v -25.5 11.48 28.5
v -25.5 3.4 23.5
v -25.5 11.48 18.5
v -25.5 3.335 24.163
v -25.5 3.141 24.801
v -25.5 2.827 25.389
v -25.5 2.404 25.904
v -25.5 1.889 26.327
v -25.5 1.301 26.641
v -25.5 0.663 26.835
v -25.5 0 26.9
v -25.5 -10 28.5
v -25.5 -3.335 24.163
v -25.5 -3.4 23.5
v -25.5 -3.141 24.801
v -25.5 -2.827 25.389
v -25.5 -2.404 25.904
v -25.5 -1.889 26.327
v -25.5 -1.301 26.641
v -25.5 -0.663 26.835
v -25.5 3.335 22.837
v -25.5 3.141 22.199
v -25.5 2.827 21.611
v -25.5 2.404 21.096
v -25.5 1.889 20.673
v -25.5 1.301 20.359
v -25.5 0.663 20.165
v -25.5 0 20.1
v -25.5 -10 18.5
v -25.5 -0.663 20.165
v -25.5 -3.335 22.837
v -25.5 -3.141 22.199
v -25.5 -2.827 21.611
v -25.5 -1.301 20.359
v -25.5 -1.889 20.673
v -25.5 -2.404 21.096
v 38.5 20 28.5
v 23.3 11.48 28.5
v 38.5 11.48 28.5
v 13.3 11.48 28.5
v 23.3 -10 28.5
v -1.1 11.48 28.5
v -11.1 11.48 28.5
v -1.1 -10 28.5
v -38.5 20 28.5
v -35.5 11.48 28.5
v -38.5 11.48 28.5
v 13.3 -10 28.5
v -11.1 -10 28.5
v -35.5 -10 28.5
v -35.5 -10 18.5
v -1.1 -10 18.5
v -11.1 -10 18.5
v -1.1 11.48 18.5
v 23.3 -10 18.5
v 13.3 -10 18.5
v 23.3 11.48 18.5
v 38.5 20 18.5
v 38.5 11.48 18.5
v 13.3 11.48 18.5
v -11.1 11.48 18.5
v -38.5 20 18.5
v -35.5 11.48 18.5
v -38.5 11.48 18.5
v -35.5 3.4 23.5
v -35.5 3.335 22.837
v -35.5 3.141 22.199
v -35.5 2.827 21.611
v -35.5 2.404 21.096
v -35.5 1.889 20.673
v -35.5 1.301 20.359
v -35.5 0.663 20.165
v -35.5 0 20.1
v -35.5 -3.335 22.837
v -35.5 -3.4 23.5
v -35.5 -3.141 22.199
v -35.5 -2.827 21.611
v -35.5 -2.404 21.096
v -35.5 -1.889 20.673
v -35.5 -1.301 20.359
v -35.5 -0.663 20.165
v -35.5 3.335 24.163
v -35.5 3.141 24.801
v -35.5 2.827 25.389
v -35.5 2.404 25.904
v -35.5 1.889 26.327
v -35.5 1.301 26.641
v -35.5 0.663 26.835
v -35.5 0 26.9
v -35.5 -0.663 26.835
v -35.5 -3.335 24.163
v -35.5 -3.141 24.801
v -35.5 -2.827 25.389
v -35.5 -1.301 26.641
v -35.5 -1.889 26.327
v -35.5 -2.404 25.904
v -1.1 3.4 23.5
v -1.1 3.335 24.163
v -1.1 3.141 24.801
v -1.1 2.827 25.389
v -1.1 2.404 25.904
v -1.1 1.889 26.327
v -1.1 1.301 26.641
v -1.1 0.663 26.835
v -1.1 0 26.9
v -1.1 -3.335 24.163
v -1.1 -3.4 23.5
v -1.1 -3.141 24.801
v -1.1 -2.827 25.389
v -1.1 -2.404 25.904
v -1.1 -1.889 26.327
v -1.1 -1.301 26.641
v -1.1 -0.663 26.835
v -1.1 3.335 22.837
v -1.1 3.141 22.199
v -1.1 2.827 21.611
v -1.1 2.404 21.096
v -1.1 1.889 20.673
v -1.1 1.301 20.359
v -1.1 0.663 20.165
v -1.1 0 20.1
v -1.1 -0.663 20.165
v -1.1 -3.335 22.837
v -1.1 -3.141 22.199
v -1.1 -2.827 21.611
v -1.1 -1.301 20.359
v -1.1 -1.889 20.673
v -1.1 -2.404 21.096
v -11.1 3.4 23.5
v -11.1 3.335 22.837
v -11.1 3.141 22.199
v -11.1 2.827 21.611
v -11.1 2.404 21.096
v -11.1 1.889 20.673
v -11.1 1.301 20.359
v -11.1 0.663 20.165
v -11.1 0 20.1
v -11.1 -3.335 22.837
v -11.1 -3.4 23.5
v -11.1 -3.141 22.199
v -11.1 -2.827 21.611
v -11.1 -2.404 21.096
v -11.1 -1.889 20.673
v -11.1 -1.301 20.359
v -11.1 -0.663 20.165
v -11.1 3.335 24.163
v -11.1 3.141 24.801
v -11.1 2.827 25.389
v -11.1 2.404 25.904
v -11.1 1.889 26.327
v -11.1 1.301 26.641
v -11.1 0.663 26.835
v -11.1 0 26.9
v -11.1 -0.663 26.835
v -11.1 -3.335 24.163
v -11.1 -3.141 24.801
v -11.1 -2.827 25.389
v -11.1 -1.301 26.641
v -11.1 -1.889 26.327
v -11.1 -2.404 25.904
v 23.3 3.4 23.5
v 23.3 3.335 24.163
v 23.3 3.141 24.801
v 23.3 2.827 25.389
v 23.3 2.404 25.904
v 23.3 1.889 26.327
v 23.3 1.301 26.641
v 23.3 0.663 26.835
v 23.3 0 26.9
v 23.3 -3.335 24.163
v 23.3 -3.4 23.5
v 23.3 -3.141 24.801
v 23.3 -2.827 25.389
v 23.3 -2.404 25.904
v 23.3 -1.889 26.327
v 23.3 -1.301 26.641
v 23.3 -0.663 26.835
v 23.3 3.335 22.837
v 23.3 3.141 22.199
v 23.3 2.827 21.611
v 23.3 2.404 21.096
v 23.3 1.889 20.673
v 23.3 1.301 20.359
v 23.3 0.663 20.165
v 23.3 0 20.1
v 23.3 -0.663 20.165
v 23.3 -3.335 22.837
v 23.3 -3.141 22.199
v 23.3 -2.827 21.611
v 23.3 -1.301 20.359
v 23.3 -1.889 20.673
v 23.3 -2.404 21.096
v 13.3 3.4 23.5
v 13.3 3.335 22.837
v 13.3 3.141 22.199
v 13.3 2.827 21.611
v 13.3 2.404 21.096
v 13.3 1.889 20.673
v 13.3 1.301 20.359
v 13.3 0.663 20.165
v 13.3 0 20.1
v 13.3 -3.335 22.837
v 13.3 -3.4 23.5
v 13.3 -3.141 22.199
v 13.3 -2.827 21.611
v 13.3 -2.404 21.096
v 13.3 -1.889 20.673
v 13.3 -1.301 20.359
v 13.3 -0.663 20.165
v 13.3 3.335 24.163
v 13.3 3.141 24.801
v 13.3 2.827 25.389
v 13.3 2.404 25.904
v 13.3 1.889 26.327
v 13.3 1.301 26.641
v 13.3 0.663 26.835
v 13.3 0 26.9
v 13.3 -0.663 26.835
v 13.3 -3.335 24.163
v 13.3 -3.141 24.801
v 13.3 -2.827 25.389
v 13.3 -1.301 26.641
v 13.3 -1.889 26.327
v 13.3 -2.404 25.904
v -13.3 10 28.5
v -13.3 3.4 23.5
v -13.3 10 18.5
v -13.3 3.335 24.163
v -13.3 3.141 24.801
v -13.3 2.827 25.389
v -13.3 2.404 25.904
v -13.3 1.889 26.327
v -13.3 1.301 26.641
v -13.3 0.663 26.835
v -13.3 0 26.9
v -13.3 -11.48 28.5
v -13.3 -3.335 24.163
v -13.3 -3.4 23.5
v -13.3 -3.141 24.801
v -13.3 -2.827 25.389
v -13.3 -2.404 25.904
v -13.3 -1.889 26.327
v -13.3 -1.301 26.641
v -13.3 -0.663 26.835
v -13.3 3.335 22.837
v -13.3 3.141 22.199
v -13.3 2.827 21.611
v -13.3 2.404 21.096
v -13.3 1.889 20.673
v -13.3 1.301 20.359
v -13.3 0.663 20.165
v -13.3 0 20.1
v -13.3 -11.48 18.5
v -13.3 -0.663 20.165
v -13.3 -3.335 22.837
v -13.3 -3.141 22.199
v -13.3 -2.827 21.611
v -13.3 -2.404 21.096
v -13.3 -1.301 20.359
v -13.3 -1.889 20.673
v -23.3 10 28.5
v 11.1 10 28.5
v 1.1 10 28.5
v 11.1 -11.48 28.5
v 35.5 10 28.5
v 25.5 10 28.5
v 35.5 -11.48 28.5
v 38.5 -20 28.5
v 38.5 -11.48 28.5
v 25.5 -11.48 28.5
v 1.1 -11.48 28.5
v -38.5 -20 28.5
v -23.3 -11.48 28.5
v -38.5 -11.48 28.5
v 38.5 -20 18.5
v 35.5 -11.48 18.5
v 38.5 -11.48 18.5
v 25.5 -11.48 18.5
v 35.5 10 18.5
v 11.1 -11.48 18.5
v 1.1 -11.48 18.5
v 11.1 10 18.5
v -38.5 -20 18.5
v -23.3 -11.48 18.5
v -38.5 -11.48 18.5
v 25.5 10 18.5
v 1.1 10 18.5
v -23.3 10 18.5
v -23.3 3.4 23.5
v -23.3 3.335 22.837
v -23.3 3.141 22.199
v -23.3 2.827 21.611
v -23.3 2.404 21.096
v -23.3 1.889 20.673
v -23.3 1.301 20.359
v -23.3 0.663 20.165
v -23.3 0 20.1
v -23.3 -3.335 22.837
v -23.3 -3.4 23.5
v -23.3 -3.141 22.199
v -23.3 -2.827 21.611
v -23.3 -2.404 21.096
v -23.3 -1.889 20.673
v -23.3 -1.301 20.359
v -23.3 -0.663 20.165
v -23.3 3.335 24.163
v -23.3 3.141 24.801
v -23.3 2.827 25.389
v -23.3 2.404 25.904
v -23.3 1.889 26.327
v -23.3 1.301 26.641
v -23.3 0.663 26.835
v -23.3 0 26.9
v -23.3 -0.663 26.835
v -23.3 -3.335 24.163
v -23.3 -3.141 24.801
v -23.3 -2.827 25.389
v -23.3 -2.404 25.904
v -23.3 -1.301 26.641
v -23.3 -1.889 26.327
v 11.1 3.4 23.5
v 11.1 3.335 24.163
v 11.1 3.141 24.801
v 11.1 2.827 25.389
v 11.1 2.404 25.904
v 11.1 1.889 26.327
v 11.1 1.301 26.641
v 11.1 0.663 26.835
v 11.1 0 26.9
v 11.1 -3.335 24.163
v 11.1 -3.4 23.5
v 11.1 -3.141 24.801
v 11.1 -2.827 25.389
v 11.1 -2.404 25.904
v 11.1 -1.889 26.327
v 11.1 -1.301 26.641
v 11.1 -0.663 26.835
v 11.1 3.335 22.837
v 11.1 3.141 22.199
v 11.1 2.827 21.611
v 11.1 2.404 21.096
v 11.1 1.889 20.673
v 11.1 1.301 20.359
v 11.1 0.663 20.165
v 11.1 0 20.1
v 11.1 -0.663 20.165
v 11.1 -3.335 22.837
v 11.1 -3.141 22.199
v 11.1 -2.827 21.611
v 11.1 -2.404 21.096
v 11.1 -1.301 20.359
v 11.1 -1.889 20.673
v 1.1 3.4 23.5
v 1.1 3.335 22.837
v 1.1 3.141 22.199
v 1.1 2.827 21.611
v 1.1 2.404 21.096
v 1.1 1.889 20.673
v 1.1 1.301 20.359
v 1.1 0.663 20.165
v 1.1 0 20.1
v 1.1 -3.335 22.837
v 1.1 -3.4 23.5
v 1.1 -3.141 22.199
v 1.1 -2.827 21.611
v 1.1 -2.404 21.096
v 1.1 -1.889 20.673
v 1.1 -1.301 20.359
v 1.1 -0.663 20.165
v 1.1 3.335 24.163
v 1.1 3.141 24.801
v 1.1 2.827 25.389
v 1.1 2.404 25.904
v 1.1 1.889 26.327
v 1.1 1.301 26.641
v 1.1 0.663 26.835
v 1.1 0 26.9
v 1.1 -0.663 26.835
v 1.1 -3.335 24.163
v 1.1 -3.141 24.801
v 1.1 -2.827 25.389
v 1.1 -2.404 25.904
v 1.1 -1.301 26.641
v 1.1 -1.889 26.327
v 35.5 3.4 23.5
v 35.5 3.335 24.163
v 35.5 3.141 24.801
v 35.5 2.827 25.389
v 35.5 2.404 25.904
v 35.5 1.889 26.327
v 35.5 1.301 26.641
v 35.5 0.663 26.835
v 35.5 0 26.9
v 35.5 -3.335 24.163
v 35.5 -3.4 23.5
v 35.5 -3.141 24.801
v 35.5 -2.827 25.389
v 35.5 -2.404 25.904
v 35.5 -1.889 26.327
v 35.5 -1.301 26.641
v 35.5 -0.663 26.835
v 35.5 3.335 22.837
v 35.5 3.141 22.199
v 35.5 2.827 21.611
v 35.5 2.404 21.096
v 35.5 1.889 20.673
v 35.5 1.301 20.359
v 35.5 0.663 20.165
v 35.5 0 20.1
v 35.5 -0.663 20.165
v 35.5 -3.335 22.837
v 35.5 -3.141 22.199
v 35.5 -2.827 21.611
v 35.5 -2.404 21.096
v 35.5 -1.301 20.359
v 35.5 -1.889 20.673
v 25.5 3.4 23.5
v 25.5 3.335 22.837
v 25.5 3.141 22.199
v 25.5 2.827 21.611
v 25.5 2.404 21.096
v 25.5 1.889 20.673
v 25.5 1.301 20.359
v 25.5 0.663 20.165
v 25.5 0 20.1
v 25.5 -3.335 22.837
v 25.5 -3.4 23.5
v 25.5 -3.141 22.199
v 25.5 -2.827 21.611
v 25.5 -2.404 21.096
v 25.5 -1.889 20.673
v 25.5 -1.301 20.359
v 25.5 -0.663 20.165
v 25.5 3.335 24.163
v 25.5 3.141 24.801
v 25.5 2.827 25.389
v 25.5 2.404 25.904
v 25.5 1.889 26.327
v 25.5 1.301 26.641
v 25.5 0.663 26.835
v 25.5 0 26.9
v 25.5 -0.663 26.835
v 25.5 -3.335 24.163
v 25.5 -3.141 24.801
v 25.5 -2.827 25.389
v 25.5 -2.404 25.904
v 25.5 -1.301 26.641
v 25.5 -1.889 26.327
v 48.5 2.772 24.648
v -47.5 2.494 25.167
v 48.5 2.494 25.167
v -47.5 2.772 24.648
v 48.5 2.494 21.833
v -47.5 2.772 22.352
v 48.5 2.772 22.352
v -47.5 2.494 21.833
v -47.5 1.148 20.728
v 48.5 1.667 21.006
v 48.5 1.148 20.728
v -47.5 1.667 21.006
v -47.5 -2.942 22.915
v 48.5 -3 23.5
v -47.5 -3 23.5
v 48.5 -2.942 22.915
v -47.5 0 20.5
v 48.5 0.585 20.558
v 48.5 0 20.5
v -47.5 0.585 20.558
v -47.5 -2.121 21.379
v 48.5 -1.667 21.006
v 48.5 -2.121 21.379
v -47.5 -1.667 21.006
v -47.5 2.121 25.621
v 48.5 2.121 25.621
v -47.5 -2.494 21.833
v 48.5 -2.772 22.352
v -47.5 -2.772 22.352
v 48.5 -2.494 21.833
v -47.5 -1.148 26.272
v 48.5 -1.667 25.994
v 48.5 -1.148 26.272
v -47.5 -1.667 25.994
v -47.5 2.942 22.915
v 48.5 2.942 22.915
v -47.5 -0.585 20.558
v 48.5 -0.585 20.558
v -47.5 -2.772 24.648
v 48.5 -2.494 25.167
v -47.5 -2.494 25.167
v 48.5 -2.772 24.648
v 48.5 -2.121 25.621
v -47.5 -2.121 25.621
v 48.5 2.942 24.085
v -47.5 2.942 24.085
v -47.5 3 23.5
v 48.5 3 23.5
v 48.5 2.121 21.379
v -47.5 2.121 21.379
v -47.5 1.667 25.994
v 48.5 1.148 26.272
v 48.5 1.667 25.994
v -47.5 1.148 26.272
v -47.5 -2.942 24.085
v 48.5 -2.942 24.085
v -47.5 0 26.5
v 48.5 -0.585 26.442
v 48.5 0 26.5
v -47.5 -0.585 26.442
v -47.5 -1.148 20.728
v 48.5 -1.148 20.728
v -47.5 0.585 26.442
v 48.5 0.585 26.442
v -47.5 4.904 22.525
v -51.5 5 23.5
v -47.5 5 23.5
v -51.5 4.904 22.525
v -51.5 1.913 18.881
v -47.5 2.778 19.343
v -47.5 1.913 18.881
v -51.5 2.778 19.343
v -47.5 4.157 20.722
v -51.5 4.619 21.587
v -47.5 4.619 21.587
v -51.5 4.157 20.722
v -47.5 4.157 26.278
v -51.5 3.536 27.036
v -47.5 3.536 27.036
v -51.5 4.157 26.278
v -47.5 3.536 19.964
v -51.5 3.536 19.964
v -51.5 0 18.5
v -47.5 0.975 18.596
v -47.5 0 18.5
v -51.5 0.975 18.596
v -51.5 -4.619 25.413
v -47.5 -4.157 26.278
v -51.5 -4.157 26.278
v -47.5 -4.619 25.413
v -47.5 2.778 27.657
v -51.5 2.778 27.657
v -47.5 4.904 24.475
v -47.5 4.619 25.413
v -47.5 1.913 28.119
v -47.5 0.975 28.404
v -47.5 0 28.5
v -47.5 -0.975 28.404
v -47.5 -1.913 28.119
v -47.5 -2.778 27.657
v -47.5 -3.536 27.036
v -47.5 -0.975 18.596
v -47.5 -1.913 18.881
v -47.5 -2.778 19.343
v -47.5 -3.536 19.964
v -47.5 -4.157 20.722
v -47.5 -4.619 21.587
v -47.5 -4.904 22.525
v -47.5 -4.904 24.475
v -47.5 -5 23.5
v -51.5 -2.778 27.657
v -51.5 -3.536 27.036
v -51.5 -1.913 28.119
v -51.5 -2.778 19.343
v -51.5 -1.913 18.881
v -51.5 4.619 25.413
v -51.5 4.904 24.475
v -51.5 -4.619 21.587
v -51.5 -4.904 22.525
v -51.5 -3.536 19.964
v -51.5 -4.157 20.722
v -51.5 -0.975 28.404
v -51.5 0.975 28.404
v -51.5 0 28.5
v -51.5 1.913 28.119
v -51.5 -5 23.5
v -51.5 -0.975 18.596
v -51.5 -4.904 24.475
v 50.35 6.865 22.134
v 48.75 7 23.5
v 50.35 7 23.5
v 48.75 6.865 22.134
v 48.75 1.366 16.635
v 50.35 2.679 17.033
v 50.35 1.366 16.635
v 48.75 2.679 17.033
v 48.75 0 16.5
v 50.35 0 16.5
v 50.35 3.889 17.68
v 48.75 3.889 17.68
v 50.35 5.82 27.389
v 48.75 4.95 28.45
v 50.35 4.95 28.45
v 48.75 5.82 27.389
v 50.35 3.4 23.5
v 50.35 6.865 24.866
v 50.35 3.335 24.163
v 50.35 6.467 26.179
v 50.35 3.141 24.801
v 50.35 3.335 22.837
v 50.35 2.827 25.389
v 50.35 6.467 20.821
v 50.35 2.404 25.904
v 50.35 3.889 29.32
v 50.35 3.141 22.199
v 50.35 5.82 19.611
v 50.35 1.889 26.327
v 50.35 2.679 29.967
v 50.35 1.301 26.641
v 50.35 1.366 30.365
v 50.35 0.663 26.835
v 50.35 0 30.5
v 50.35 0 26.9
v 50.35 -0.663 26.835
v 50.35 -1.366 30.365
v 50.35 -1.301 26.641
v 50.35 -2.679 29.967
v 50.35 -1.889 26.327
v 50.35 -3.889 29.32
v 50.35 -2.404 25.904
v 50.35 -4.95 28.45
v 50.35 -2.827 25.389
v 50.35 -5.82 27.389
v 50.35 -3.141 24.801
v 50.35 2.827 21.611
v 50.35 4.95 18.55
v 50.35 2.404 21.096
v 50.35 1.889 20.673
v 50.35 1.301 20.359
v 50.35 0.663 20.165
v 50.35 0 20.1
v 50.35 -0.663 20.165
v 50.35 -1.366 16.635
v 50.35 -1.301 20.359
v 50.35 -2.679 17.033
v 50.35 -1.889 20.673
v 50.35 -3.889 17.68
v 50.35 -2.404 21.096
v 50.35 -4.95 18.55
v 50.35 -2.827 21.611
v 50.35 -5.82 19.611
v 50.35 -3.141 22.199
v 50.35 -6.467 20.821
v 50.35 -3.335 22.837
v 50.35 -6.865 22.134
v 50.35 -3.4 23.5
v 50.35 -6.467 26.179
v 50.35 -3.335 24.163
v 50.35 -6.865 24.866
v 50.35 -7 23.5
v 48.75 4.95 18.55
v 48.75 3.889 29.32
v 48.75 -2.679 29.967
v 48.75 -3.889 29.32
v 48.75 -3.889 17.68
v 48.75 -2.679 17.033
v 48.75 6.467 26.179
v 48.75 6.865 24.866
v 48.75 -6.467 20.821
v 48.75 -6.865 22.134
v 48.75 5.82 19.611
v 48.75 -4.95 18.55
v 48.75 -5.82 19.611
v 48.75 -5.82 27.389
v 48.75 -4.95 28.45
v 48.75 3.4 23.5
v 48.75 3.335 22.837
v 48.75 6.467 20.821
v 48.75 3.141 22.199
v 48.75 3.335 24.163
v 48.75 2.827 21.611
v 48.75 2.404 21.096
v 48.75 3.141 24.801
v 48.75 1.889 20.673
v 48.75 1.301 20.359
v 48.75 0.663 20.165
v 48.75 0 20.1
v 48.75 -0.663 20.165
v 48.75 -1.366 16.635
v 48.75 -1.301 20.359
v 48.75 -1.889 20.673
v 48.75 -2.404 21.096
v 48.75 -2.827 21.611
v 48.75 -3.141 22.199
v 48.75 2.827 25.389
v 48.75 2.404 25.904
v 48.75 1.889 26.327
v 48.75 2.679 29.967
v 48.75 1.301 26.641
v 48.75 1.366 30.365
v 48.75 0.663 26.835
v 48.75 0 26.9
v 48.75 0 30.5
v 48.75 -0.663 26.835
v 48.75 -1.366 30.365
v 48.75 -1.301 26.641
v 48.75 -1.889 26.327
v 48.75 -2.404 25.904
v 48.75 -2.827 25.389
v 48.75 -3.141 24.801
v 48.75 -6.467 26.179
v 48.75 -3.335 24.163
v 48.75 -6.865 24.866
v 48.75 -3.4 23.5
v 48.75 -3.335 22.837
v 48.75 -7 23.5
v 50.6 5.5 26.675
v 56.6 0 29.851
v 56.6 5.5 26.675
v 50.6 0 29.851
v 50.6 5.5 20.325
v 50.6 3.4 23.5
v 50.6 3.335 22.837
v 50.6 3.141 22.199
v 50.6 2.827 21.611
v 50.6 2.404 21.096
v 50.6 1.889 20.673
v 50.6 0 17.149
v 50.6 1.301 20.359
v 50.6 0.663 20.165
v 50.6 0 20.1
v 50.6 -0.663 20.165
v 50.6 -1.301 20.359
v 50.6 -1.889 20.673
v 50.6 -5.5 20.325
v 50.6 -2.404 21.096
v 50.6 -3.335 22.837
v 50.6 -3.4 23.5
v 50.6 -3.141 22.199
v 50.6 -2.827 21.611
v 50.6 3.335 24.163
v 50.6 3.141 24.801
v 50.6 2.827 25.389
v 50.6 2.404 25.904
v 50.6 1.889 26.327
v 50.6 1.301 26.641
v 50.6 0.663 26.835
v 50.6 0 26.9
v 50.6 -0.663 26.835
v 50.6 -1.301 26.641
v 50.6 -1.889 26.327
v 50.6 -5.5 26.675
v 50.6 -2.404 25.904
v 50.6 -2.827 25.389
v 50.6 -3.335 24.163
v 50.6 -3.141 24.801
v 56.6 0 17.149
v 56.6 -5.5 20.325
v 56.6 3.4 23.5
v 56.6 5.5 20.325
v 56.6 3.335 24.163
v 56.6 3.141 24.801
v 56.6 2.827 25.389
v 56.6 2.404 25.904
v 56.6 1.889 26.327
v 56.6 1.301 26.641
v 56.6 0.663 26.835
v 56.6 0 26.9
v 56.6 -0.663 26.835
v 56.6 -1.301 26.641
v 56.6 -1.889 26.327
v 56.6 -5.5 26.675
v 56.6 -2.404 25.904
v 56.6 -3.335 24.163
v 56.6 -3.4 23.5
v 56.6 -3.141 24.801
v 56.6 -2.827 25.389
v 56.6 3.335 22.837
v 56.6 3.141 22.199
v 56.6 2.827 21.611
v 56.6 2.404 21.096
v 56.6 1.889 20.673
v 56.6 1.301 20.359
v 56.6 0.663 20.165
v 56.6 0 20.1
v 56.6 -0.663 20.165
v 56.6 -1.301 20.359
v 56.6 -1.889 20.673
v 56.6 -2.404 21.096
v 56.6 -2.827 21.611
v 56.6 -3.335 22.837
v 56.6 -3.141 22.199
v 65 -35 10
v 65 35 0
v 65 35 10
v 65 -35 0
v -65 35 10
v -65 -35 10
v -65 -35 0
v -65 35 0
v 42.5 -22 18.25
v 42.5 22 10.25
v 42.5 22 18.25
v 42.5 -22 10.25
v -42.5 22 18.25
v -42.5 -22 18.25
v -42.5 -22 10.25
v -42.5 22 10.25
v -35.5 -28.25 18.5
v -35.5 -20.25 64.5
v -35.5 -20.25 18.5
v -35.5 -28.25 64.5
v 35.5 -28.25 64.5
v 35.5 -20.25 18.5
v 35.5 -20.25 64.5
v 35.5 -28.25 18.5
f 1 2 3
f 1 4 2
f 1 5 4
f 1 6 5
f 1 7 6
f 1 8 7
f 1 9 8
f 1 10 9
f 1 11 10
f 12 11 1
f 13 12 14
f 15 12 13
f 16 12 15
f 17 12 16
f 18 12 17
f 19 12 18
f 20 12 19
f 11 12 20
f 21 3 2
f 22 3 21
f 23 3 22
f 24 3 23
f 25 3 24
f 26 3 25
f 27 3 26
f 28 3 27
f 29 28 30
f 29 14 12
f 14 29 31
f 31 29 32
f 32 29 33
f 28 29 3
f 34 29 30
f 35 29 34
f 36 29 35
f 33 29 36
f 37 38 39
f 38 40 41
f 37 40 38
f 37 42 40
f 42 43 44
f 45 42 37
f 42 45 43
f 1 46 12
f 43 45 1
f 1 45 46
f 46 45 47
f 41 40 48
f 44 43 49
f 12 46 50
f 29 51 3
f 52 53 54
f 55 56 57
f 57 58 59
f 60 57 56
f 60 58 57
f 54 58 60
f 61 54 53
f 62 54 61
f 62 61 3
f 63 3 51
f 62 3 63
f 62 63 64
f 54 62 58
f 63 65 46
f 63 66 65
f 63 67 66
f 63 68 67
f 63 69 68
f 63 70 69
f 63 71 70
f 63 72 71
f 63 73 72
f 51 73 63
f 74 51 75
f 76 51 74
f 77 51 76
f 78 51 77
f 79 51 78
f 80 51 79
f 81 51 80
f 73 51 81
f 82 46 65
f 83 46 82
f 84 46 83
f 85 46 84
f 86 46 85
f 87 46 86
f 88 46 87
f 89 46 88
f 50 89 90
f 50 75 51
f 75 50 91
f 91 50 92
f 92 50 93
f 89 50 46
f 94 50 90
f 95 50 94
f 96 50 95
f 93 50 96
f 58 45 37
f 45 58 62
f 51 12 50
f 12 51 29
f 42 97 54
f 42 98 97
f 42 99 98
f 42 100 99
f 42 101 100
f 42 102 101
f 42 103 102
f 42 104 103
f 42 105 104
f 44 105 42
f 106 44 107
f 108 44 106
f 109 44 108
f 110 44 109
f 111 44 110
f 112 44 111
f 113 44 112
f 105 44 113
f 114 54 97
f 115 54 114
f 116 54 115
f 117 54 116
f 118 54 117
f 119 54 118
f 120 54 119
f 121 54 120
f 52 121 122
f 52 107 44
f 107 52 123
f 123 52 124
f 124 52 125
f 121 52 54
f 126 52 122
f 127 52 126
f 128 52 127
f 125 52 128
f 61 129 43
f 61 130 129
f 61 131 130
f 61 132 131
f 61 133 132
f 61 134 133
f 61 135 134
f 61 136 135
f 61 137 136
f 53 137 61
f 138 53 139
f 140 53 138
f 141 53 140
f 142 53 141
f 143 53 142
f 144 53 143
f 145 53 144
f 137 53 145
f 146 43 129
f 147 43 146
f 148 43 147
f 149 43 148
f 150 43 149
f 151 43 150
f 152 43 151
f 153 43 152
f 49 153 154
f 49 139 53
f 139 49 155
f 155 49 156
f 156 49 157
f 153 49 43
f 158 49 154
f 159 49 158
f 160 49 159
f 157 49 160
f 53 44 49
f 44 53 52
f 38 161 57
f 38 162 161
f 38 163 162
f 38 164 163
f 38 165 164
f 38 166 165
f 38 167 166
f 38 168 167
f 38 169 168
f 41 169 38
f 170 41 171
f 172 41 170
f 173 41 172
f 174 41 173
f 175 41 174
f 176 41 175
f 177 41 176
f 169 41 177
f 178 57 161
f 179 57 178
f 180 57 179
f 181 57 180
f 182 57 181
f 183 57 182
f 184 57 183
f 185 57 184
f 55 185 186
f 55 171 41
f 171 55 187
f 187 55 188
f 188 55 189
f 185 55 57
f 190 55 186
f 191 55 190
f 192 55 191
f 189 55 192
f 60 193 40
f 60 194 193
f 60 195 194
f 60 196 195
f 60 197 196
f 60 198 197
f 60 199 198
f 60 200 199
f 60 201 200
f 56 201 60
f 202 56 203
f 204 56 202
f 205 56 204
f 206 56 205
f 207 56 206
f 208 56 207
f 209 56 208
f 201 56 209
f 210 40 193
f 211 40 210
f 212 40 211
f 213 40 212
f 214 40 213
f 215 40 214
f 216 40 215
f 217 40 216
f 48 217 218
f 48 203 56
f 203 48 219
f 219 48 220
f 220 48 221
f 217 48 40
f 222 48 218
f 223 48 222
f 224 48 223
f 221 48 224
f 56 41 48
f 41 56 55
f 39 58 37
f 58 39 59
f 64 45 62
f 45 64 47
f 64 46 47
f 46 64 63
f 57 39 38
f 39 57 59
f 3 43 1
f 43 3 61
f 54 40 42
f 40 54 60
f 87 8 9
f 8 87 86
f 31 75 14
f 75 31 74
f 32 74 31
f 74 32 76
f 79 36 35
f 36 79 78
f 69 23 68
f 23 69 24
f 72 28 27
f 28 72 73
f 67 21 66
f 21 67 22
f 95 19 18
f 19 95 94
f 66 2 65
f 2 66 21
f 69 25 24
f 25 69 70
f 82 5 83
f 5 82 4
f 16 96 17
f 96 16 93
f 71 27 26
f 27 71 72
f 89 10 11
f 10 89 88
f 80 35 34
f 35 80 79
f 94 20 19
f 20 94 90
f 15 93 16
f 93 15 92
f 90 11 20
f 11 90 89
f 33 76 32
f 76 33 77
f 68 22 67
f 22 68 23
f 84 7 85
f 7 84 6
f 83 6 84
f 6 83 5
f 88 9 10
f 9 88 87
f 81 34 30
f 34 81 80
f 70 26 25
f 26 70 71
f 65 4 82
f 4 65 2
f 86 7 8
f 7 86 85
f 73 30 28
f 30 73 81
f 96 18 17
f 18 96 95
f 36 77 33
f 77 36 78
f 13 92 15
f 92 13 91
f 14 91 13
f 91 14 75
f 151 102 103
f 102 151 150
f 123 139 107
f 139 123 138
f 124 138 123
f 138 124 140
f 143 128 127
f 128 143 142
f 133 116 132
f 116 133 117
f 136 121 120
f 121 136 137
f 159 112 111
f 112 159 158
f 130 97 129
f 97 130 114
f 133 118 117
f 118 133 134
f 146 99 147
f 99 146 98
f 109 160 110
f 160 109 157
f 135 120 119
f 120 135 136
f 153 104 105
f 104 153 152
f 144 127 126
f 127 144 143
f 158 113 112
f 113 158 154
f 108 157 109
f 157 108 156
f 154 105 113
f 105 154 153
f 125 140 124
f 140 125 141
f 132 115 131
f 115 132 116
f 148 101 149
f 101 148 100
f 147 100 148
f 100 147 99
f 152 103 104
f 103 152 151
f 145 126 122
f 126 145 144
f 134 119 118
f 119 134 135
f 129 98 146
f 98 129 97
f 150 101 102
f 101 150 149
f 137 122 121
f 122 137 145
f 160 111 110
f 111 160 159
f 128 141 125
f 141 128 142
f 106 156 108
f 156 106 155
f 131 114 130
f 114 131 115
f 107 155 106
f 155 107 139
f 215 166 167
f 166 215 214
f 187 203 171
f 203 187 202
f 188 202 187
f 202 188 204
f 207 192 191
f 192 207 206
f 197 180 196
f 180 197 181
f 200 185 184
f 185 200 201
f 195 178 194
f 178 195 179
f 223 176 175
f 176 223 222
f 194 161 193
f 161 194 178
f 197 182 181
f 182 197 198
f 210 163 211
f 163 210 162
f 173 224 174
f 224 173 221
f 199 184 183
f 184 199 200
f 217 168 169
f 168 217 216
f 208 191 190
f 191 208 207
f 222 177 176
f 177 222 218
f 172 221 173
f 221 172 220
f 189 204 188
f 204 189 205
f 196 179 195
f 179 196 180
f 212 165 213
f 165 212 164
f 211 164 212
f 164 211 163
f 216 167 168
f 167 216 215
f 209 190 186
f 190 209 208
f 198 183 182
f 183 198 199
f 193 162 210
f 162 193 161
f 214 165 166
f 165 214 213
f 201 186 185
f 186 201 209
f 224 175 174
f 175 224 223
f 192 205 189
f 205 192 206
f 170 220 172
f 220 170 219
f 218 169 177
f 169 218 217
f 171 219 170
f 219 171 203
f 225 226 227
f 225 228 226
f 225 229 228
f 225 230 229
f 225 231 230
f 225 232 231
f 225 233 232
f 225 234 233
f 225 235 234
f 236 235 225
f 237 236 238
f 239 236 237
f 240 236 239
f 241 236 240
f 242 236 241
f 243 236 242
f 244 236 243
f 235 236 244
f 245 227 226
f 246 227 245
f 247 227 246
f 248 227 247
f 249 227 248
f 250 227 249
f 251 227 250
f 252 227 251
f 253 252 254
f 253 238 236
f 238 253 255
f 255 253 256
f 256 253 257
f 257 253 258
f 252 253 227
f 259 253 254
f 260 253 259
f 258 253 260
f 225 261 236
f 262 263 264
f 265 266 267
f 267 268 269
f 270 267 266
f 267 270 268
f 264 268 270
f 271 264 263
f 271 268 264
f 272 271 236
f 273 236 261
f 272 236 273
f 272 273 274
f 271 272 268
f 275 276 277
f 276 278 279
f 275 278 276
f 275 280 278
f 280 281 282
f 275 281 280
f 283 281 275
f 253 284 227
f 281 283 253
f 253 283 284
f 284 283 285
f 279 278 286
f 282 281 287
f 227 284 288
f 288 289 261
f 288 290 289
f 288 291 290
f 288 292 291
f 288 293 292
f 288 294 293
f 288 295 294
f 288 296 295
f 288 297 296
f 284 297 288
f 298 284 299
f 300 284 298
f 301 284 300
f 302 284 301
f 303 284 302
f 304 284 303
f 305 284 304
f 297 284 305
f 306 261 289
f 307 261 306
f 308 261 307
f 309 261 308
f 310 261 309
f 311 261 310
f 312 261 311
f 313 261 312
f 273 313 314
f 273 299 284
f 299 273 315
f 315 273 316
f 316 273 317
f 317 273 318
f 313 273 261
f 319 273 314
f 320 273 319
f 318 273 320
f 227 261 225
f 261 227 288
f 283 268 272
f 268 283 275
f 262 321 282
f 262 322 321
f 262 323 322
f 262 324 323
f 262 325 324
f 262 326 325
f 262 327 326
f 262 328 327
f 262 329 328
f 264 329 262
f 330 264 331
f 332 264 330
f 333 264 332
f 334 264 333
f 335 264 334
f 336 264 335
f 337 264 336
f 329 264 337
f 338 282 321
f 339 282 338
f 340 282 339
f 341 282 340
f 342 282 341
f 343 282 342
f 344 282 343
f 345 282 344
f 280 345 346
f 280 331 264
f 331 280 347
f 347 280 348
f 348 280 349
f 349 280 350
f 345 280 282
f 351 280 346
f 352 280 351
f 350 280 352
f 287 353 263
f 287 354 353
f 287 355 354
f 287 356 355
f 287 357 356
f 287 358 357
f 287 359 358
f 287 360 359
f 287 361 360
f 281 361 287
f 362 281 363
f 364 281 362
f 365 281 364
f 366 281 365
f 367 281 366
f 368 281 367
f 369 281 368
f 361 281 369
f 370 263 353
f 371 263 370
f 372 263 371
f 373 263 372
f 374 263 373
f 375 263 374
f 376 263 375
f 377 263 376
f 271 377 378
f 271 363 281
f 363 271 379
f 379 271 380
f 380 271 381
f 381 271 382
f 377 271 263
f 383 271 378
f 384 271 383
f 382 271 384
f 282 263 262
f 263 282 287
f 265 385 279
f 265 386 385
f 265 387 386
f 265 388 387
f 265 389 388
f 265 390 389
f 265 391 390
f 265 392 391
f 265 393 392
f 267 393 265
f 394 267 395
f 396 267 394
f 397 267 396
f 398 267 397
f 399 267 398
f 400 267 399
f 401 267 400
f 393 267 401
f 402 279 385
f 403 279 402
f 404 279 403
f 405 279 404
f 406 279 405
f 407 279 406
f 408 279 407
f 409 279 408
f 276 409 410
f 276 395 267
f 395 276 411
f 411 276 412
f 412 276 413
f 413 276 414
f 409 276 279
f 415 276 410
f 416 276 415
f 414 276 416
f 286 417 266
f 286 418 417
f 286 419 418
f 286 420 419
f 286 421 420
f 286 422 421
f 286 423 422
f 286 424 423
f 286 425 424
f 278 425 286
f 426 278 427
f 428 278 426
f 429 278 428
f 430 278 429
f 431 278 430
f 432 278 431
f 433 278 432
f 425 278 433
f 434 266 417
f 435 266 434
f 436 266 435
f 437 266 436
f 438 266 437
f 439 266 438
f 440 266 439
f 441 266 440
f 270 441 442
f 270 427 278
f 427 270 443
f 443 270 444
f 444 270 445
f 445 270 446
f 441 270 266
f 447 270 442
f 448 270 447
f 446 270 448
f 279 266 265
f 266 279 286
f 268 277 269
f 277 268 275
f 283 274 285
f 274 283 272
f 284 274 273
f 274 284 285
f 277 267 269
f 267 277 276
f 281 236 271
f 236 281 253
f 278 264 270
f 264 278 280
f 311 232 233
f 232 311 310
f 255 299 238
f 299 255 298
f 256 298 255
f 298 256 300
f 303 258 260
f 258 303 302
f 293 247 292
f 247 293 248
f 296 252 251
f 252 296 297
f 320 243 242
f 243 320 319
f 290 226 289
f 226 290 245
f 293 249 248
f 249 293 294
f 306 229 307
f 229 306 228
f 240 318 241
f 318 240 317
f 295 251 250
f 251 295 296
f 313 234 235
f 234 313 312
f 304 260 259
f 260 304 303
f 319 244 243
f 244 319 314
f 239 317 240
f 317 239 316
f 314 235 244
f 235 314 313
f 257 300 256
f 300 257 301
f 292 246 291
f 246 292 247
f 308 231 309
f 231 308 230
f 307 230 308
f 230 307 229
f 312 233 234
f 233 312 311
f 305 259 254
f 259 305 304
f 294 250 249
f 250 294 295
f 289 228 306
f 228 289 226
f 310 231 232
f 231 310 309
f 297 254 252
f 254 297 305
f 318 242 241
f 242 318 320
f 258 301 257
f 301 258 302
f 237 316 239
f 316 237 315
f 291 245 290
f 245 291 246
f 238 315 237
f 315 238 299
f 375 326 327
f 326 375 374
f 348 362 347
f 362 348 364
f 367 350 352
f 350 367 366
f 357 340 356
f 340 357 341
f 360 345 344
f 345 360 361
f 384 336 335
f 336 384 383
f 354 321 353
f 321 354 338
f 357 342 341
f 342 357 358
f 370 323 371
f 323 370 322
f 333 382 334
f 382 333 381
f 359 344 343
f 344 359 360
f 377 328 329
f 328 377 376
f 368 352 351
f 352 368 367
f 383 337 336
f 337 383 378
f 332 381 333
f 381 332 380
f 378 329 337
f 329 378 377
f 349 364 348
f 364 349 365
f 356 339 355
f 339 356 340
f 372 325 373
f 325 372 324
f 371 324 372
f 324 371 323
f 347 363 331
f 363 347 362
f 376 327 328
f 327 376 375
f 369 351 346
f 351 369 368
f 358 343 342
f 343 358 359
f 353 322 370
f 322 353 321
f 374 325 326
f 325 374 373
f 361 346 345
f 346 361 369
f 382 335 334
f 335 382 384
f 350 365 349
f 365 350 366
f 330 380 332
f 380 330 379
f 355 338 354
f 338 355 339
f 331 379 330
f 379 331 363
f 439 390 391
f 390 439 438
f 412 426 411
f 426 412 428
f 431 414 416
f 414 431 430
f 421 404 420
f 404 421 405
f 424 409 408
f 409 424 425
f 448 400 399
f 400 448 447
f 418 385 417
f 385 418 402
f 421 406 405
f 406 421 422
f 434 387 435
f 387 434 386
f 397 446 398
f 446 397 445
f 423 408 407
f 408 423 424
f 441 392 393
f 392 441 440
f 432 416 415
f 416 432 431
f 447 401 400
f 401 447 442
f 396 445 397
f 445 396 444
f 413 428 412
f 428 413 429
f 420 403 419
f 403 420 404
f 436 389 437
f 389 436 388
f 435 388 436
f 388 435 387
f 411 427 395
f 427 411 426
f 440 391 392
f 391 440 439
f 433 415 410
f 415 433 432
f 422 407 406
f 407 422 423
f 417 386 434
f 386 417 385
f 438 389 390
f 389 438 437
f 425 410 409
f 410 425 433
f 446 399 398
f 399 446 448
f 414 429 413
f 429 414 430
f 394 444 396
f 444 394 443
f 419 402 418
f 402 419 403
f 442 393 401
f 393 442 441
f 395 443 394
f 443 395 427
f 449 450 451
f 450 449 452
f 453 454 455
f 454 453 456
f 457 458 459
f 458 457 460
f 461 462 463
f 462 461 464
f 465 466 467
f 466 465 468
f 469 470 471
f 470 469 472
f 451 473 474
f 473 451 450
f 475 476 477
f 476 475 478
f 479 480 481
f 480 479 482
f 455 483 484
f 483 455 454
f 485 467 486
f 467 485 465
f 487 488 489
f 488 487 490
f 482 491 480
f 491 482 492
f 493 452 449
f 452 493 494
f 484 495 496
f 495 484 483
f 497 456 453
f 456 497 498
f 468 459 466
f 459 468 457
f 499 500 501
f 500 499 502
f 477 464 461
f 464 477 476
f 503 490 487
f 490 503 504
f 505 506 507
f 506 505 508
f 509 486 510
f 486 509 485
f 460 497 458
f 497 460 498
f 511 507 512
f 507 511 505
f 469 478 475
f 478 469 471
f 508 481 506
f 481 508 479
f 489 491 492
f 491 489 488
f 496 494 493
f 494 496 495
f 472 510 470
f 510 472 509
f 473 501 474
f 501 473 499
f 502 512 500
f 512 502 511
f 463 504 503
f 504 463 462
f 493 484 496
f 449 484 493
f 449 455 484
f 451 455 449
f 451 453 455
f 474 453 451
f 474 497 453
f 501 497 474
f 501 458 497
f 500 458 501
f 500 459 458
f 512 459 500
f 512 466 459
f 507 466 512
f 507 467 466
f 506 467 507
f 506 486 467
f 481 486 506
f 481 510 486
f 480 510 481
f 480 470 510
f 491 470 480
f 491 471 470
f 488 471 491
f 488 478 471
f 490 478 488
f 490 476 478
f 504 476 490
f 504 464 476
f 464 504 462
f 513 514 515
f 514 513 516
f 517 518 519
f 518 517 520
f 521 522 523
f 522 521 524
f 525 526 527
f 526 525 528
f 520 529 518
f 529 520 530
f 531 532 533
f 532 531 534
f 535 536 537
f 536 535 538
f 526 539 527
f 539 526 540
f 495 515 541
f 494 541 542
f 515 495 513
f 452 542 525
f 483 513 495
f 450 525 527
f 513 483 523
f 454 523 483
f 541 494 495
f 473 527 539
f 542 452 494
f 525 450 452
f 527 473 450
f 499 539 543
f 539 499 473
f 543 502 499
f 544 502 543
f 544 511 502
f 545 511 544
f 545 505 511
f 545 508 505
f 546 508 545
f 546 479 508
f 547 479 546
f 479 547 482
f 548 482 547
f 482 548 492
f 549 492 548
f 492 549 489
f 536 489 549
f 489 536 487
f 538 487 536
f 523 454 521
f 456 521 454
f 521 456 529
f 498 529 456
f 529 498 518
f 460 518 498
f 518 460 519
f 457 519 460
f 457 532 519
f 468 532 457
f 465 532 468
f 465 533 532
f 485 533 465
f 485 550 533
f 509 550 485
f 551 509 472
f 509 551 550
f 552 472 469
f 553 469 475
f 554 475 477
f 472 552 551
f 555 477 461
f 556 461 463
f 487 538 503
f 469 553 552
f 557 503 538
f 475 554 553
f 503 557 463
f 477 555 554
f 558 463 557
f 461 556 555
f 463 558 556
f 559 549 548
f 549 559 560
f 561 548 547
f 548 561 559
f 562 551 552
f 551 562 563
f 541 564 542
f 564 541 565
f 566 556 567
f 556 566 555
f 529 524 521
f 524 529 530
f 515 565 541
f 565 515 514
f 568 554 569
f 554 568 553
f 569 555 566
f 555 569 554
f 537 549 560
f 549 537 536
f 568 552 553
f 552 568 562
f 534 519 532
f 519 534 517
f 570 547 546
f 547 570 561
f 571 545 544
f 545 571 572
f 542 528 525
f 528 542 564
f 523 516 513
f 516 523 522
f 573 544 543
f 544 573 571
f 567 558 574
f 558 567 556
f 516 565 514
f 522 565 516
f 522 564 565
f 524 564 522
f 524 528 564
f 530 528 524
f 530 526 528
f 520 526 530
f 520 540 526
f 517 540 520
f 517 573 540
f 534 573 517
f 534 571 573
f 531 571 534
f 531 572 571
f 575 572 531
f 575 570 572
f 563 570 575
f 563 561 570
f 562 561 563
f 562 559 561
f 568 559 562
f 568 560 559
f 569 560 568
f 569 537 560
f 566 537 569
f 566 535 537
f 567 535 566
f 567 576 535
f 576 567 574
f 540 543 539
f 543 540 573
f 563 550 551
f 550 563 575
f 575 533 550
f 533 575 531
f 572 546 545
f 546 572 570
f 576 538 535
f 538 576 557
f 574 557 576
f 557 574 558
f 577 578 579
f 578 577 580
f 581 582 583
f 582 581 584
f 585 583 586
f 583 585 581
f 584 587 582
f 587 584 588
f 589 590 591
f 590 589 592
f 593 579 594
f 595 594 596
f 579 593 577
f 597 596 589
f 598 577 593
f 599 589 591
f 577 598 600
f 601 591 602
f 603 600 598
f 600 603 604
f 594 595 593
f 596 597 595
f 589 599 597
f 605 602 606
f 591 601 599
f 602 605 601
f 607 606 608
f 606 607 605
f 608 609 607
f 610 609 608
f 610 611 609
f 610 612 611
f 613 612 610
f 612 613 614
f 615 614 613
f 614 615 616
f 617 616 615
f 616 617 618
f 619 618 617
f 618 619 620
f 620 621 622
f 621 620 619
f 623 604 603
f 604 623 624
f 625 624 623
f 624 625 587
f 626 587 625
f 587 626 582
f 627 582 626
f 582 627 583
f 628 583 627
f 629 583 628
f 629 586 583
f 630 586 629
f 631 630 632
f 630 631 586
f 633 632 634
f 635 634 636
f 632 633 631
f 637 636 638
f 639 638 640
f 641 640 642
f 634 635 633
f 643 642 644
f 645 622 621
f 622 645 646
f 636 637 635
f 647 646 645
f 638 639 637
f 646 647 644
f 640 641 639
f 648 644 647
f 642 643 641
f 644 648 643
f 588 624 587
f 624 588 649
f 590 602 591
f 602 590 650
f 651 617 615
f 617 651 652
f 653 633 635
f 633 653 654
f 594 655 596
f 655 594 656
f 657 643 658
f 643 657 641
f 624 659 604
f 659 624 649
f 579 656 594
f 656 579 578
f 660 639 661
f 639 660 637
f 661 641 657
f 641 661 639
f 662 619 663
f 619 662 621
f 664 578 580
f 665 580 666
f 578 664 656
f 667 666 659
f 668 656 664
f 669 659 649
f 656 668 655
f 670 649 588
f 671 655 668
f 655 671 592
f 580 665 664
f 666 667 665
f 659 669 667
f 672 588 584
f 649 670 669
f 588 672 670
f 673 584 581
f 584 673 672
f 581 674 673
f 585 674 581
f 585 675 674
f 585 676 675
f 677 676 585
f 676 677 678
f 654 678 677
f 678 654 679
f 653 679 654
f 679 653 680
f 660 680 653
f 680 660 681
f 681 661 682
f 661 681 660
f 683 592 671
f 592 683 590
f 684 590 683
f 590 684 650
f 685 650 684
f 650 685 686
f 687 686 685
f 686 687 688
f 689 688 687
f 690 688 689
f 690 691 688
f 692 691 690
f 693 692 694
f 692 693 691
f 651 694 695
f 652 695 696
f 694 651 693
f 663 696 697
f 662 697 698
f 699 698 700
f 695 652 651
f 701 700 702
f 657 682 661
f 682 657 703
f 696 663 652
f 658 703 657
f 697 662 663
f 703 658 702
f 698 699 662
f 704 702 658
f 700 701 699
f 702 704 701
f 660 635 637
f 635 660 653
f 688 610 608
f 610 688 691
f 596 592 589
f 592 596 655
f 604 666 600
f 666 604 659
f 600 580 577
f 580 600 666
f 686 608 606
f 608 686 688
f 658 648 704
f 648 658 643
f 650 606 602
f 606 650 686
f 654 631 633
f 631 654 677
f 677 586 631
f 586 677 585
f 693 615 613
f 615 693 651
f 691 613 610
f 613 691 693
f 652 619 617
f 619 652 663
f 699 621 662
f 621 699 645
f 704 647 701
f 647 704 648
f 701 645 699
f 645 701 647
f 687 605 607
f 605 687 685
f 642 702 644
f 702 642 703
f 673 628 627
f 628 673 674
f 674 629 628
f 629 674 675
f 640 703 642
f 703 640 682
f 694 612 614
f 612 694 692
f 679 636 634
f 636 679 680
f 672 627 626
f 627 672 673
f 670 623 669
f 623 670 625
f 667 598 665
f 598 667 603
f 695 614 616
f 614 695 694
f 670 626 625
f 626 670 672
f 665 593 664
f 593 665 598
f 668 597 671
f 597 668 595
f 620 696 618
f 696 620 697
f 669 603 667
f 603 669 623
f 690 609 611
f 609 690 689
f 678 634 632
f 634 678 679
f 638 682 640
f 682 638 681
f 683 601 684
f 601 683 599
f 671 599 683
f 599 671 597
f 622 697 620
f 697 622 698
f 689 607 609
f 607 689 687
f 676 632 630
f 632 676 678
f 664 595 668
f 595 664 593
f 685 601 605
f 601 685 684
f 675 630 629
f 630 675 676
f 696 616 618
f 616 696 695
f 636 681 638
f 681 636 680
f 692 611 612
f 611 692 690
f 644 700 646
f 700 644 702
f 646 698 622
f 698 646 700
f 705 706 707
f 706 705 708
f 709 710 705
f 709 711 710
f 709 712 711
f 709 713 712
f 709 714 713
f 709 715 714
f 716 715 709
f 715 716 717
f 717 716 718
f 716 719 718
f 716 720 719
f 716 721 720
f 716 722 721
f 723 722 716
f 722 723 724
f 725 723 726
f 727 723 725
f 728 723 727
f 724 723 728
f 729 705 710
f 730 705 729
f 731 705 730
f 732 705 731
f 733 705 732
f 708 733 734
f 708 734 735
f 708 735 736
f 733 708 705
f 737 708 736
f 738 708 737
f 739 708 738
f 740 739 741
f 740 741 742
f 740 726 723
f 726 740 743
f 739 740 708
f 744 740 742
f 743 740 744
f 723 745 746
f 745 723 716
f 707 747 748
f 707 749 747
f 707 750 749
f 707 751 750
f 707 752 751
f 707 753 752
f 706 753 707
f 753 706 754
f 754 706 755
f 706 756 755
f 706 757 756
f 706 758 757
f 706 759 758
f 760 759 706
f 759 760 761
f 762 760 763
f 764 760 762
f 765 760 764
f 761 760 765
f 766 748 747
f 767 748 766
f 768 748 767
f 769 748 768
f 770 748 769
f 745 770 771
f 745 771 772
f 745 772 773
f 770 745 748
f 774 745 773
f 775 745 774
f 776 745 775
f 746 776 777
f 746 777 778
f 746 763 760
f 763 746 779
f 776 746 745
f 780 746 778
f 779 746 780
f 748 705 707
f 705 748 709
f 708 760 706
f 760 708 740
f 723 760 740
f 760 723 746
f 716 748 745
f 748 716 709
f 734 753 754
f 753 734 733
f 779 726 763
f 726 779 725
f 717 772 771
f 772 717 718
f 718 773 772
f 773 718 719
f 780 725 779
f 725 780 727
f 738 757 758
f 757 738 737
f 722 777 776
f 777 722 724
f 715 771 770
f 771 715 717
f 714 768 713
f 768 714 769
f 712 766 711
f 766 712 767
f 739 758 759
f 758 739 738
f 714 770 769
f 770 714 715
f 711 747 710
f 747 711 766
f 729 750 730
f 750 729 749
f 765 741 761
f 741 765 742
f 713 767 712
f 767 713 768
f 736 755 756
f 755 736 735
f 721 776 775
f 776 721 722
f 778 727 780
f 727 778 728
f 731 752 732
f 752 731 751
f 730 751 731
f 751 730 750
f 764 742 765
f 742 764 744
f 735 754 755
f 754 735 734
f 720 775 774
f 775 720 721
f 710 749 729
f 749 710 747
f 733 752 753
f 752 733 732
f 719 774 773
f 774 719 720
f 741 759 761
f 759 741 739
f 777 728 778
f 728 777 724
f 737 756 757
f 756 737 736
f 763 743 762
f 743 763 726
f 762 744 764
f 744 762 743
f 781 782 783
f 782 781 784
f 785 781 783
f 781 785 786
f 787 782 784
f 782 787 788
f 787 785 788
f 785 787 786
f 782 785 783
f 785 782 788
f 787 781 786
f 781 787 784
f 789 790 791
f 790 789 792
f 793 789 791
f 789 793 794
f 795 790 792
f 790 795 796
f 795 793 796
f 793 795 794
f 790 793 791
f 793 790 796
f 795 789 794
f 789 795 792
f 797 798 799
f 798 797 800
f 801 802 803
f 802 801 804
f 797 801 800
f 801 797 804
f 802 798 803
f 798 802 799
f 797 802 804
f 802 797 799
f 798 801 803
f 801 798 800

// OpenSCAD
$fn = 32;

// ------------------------------------------------------------------------
// Comb hinge with flap: leaf 77 x 20 mm, pin d6, flap 46 mm
// Every part is its own module, assembly() places every instance.
// ------------------------------------------------------------------------

// --- part 1 ---
module hinge_bed() {
  difference() {
    translate([-65, -35, 0]) cube([130, 70, 10]);
  }
}

// --- part 2 ---
module hinge_riser() {
  difference() {
    translate([-42.5, -22, 0]) cube([85, 44, 8]);
  }
}

// --- part 3 ---
module hinge_leaf_a() {
  difference() {
    union() {
      translate([-35.5, -10, -5]) cube([10, 30, 10]);
      translate([-11.1, -10, -5]) cube([10, 30, 10]);
      translate([13.3, -10, -5]) cube([10, 30, 10]);
      translate([-38.5, 11.48, -5]) cube([77, 8.52, 10]);
    }
    translate([-30.5, 0, 0]) rotate([0, 90, 0]) cylinder(h = 12, d = 6.8, center = true);
    translate([-6.1, 0, 0]) rotate([0, 90, 0]) cylinder(h = 12, d = 6.8, center = true);
    translate([18.3, 0, 0]) rotate([0, 90, 0]) cylinder(h = 12, d = 6.8, center = true);
  }
}

// --- part 4 ---
module hinge_leaf_b() {
  difference() {
    union() {
      translate([-23.3, -20, -5]) cube([10, 30, 10]);
      translate([1.1, -20, -5]) cube([10, 30, 10]);
      translate([25.5, -20, -5]) cube([10, 30, 10]);
      translate([-38.5, -20, -5]) cube([77, 8.52, 10]);
    }
    translate([-18.3, 0, 0]) rotate([0, 90, 0]) cylinder(h = 12, d = 6.8, center = true);
    translate([6.1, 0, 0]) rotate([0, 90, 0]) cylinder(h = 12, d = 6.8, center = true);
    translate([30.5, 0, 0]) rotate([0, 90, 0]) cylinder(h = 12, d = 6.8, center = true);
  }
}

// --- part 5 ---
module hinge_flap() {
  difference() {
    translate([-35.5, -23, 0]) cube([71, 46, 8]);
  }
}

// --- part 6 ---
module hinge_pin() {
  rotate([0, 90, 0]) cylinder(h = 97, d = 6, center = true);
  translate([-51.5, 0, 0]) rotate([0, 90, 0]) cylinder(h = 4, d = 10);
}

// --- part 7 ---
module pin_washer() {
  difference() {
      translate([0, 0, 0]) cylinder(h = 1.6, d = 14);
      translate([0, 0, -1]) cylinder(h = 3.6, d = 6.8);
    }
}

// --- part 8 ---
module pin_nut() {
  difference() {
    linear_extrude(height = 6) polygon(points = [[6.351, 0], [3.175, 5.5], [-3.175, 5.5], [-6.351, 0], [-3.175, -5.5], [3.175, -5.5]]);
    translate([0, 0, -1]) cylinder(h = 8, d = 6.8);
  }
}

// --- assembly ---
module assembly() {
  color([0.80, 0.24, 0.20]) translate([0, 0, 0]) rotate([0, 0, 0]) hinge_bed();
  color([0.20, 0.45, 0.75]) translate([0, 0, 10.25]) rotate([0, 0, 0]) hinge_riser();
  color([0.25, 0.62, 0.32]) translate([0, 0, 23.5]) rotate([0, 0, 0]) hinge_leaf_a();
  color([0.92, 0.70, 0.18]) translate([0, 0, 23.5]) rotate([0, 0, 0]) hinge_leaf_b();
  color([0.58, 0.35, 0.70]) translate([0, -20.25, 41.5]) rotate([90, 0, 0]) hinge_flap();
  color([0.16, 0.66, 0.66]) translate([0, 0, 23.5]) rotate([0, 0, 0]) hinge_pin();
  color([0.85, 0.48, 0.18]) translate([48.75, 0, 23.5]) rotate([0, 90, 0]) pin_washer();
  color([0.55, 0.60, 0.65]) translate([50.6, 0, 23.5]) rotate([0, 90, 0]) pin_nut();
}

assembly();
